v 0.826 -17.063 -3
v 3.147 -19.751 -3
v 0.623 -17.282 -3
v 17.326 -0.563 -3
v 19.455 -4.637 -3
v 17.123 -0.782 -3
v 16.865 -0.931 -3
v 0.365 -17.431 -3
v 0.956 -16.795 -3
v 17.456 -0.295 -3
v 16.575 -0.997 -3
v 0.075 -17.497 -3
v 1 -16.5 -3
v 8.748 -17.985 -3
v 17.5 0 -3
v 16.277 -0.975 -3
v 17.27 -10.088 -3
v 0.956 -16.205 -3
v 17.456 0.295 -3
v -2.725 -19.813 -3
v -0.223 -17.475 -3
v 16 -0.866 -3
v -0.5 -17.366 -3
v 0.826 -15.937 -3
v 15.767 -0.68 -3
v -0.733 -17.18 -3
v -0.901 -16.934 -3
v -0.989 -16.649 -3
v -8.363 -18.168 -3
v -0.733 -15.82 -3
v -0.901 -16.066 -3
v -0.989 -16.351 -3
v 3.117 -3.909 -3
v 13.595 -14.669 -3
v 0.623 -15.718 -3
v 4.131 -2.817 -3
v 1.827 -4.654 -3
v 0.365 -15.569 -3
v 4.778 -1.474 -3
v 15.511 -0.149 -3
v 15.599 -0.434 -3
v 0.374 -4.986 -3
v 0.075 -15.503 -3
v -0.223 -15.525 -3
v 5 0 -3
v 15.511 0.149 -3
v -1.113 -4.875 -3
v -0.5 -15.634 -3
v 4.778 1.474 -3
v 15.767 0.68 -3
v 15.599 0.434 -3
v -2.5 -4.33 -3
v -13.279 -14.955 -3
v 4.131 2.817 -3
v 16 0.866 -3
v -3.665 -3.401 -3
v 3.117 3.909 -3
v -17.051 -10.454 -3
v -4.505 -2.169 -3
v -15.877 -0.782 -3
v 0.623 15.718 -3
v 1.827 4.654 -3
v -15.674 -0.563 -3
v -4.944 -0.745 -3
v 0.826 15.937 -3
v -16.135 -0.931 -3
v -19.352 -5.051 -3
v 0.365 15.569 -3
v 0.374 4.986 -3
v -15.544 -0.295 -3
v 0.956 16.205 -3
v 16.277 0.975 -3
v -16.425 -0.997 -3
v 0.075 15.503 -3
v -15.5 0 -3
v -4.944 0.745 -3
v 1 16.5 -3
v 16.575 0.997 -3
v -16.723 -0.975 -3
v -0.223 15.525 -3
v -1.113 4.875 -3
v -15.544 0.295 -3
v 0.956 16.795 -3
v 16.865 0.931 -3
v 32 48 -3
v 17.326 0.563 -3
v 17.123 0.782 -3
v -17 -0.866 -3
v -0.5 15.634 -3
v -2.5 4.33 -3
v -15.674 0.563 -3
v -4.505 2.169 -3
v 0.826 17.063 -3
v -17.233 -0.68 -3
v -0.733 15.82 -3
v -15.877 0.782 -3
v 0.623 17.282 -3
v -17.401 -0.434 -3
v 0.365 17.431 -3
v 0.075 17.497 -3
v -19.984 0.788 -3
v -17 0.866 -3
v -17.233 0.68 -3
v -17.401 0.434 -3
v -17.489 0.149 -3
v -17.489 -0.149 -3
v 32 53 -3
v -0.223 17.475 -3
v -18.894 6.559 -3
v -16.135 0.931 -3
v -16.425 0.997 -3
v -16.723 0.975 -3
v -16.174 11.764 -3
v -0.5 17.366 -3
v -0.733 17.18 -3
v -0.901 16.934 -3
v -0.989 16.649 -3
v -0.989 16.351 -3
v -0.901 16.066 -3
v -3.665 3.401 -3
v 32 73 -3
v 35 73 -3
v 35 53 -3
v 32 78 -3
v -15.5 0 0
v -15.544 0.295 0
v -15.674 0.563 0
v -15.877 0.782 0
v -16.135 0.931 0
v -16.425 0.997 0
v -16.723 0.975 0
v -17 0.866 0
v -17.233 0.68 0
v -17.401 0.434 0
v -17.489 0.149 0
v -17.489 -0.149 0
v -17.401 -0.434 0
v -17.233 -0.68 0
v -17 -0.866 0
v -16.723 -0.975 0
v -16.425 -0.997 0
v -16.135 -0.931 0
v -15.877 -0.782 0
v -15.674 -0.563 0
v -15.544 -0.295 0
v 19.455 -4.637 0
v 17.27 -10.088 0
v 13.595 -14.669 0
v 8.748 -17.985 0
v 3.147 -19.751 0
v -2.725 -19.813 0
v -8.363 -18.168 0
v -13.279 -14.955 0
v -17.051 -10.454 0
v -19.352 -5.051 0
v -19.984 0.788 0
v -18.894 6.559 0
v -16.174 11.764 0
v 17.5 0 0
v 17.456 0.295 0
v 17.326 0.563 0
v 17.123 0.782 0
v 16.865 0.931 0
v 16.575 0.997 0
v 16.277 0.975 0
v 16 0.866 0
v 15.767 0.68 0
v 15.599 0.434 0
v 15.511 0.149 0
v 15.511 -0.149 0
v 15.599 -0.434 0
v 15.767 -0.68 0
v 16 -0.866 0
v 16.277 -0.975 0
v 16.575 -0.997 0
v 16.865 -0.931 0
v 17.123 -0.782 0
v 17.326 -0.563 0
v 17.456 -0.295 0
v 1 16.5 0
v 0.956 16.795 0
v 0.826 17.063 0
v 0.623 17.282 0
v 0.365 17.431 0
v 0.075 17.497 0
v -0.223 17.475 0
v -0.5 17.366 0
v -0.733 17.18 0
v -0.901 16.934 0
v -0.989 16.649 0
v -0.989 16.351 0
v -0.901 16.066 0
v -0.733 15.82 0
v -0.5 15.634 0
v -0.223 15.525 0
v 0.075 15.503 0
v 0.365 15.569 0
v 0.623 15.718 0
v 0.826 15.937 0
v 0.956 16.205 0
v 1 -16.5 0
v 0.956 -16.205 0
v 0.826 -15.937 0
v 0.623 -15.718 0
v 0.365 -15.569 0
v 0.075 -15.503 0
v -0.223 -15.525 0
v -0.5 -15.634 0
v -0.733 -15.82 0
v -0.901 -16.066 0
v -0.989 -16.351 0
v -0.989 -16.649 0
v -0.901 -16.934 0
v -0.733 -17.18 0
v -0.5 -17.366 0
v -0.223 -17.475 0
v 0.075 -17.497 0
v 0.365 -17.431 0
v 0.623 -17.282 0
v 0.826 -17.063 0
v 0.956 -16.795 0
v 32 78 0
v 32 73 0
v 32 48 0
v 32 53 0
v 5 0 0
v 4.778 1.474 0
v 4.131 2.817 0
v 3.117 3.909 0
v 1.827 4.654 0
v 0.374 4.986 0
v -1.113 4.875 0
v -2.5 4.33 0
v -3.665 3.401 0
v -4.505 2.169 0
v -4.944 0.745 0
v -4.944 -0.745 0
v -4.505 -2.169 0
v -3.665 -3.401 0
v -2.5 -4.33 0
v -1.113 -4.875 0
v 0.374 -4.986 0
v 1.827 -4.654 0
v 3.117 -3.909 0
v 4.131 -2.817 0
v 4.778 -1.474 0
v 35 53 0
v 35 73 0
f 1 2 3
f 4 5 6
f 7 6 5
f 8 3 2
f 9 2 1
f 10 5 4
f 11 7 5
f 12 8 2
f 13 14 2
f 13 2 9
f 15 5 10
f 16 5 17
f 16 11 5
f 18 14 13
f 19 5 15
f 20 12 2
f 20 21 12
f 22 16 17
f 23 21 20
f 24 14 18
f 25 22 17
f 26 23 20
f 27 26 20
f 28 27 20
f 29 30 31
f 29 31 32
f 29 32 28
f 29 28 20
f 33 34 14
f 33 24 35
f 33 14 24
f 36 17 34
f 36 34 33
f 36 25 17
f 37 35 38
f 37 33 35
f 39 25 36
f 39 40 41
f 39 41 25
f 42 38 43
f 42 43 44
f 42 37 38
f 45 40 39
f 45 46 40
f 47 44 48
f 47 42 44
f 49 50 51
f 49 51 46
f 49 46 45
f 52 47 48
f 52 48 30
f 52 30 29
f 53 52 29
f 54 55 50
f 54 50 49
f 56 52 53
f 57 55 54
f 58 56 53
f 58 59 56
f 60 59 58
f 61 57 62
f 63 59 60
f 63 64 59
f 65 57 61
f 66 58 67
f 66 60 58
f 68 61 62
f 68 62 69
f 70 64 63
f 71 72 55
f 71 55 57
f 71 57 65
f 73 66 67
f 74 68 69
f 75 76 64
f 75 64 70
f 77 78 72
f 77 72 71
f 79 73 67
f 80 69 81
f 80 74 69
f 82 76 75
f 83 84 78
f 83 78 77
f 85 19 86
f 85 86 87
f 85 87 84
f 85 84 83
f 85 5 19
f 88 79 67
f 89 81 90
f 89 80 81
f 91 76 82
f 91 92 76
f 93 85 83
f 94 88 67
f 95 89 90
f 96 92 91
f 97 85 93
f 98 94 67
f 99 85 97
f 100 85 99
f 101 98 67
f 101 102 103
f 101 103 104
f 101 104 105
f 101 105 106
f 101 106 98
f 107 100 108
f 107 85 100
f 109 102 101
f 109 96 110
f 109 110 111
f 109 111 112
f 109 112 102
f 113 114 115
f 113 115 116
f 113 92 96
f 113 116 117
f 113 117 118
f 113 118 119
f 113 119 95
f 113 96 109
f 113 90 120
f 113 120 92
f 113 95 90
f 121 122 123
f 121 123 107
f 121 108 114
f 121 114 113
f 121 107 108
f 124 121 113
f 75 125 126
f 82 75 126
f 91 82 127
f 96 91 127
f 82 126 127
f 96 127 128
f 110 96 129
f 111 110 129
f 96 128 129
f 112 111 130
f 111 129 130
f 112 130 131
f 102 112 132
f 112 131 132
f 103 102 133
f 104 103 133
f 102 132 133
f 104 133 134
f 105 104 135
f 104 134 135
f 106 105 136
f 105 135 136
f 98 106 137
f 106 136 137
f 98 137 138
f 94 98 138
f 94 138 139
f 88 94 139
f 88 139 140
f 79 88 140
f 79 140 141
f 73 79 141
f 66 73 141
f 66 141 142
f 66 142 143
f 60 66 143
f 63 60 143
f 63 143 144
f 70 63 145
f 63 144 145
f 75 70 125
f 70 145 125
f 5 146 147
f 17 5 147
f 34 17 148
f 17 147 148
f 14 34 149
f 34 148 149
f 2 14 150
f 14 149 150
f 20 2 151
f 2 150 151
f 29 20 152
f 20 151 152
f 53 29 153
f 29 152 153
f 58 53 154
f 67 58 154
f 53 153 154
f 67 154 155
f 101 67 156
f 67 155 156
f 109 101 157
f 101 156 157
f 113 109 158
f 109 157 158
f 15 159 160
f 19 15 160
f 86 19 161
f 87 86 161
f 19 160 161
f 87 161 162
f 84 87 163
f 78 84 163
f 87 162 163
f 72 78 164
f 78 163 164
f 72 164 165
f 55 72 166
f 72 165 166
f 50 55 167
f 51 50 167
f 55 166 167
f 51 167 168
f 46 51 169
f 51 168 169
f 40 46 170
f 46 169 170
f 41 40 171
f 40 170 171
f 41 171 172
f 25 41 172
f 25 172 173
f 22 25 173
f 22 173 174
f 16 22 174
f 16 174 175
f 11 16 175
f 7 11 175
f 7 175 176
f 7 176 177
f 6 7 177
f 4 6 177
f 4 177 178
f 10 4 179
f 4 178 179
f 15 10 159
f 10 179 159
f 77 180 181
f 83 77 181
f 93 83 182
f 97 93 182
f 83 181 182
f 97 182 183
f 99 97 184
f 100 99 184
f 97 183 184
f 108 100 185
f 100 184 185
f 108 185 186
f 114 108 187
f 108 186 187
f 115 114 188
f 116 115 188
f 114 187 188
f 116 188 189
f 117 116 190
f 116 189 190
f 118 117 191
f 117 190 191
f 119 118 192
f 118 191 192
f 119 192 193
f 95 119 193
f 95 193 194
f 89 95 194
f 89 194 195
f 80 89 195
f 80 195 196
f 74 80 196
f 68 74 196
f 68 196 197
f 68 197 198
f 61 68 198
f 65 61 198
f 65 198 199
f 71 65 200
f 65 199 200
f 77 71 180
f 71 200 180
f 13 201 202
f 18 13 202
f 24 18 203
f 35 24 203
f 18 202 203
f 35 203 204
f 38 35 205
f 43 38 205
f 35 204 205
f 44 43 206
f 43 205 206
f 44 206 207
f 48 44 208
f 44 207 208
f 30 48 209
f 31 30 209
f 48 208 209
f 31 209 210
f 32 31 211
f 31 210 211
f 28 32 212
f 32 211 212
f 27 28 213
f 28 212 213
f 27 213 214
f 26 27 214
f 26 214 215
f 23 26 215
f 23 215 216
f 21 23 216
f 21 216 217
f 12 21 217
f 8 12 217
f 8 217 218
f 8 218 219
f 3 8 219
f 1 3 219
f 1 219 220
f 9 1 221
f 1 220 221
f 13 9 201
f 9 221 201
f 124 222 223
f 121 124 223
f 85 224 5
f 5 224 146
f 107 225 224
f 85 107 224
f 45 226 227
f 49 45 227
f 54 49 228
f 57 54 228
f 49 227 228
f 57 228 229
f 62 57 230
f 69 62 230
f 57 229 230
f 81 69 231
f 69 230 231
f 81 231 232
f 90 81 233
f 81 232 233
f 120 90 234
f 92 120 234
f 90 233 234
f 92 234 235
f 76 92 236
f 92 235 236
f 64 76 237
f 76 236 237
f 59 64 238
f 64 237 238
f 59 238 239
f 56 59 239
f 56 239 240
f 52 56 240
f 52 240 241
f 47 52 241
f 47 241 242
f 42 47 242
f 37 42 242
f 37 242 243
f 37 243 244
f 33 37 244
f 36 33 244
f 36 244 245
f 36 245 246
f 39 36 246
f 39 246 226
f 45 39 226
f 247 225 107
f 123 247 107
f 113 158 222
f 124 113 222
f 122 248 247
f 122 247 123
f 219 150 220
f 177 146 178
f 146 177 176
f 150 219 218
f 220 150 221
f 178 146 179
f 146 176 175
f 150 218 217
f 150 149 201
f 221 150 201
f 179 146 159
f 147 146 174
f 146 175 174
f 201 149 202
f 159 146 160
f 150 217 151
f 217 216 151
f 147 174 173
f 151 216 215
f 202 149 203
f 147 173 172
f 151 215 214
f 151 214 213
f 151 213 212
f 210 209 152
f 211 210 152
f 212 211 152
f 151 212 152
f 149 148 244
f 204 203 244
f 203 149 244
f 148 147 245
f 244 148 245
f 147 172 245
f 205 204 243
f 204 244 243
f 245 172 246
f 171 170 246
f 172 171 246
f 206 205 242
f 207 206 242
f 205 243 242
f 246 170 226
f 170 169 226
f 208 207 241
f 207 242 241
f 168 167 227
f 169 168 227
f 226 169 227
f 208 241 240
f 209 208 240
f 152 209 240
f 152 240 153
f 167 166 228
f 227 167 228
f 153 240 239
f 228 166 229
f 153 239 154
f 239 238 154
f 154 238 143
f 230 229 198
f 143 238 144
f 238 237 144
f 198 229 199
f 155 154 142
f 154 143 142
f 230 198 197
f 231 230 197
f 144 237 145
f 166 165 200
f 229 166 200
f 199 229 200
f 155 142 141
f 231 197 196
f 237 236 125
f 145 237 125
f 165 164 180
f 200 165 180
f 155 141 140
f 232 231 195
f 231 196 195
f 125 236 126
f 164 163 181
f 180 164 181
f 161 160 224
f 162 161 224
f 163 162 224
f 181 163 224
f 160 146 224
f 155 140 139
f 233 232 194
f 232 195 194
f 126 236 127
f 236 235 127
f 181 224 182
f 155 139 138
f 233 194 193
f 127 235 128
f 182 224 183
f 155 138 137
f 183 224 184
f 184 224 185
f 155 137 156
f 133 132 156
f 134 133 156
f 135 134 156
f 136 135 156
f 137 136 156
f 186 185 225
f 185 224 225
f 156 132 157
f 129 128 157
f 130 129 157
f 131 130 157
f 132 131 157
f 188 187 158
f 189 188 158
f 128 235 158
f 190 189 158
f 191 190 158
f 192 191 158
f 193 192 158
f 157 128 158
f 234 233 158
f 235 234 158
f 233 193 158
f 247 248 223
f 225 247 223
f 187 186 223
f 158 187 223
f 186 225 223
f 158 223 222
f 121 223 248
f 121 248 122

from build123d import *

# Parameters (mm, degrees)
SKETCH1_R           = 1
BOSS_EXTRUDE1_DEPTH = 3
SKETCH2_R           = 5
CUT_EXTRUDE1_DEPTH  = 10
SKETCH4_W           = 3
SKETCH4_H           = 20
BOSS_EXTRUDE3_DEPTH = 3


with BuildPart() as part:
    # Sketch1 → Boss-Extrude1 (new body)
    with BuildSketch(Plane.XY):
        with BuildLine():
            Line((-16.174411119, 11.763860972), (32, 78))
            Line((32, 78), (32, 48))
            Line((32, 48), (19.455095298, -4.636730199))
            ThreePointArc((19.455095298, -4.636730199), (-8.362748941, -18.167675419), (-16.174411119, 11.763860972))
        make_face()
        with Locations((0, 16.5)):
            Circle(SKETCH1_R, mode=Mode.SUBTRACT)
        with Locations((-16.5, 0)):
            Circle(SKETCH1_R, mode=Mode.SUBTRACT)
        with Locations((0, -16.5)):
            Circle(SKETCH1_R, mode=Mode.SUBTRACT)
        with Locations((16.5, 0)):
            Circle(SKETCH1_R, mode=Mode.SUBTRACT)
    extrude(amount=-BOSS_EXTRUDE1_DEPTH)

    # Sketch2 → Cut-Extrude1 (cut)
    with BuildSketch(Plane.XY):
        Circle(SKETCH2_R)
    extrude(amount=-CUT_EXTRUDE1_DEPTH, mode=Mode.SUBTRACT)

    # Sketch4 → Boss-Extrude3 (add)
    with BuildSketch(Plane(origin=(32, 0, 0), x_dir=(0, 0, -1), z_dir=(1, 0, 0))):
        with Locations((1.5, 63)):
            Rectangle(SKETCH4_W, SKETCH4_H)
    extrude(amount=BOSS_EXTRUDE3_DEPTH)


solid = part.part
